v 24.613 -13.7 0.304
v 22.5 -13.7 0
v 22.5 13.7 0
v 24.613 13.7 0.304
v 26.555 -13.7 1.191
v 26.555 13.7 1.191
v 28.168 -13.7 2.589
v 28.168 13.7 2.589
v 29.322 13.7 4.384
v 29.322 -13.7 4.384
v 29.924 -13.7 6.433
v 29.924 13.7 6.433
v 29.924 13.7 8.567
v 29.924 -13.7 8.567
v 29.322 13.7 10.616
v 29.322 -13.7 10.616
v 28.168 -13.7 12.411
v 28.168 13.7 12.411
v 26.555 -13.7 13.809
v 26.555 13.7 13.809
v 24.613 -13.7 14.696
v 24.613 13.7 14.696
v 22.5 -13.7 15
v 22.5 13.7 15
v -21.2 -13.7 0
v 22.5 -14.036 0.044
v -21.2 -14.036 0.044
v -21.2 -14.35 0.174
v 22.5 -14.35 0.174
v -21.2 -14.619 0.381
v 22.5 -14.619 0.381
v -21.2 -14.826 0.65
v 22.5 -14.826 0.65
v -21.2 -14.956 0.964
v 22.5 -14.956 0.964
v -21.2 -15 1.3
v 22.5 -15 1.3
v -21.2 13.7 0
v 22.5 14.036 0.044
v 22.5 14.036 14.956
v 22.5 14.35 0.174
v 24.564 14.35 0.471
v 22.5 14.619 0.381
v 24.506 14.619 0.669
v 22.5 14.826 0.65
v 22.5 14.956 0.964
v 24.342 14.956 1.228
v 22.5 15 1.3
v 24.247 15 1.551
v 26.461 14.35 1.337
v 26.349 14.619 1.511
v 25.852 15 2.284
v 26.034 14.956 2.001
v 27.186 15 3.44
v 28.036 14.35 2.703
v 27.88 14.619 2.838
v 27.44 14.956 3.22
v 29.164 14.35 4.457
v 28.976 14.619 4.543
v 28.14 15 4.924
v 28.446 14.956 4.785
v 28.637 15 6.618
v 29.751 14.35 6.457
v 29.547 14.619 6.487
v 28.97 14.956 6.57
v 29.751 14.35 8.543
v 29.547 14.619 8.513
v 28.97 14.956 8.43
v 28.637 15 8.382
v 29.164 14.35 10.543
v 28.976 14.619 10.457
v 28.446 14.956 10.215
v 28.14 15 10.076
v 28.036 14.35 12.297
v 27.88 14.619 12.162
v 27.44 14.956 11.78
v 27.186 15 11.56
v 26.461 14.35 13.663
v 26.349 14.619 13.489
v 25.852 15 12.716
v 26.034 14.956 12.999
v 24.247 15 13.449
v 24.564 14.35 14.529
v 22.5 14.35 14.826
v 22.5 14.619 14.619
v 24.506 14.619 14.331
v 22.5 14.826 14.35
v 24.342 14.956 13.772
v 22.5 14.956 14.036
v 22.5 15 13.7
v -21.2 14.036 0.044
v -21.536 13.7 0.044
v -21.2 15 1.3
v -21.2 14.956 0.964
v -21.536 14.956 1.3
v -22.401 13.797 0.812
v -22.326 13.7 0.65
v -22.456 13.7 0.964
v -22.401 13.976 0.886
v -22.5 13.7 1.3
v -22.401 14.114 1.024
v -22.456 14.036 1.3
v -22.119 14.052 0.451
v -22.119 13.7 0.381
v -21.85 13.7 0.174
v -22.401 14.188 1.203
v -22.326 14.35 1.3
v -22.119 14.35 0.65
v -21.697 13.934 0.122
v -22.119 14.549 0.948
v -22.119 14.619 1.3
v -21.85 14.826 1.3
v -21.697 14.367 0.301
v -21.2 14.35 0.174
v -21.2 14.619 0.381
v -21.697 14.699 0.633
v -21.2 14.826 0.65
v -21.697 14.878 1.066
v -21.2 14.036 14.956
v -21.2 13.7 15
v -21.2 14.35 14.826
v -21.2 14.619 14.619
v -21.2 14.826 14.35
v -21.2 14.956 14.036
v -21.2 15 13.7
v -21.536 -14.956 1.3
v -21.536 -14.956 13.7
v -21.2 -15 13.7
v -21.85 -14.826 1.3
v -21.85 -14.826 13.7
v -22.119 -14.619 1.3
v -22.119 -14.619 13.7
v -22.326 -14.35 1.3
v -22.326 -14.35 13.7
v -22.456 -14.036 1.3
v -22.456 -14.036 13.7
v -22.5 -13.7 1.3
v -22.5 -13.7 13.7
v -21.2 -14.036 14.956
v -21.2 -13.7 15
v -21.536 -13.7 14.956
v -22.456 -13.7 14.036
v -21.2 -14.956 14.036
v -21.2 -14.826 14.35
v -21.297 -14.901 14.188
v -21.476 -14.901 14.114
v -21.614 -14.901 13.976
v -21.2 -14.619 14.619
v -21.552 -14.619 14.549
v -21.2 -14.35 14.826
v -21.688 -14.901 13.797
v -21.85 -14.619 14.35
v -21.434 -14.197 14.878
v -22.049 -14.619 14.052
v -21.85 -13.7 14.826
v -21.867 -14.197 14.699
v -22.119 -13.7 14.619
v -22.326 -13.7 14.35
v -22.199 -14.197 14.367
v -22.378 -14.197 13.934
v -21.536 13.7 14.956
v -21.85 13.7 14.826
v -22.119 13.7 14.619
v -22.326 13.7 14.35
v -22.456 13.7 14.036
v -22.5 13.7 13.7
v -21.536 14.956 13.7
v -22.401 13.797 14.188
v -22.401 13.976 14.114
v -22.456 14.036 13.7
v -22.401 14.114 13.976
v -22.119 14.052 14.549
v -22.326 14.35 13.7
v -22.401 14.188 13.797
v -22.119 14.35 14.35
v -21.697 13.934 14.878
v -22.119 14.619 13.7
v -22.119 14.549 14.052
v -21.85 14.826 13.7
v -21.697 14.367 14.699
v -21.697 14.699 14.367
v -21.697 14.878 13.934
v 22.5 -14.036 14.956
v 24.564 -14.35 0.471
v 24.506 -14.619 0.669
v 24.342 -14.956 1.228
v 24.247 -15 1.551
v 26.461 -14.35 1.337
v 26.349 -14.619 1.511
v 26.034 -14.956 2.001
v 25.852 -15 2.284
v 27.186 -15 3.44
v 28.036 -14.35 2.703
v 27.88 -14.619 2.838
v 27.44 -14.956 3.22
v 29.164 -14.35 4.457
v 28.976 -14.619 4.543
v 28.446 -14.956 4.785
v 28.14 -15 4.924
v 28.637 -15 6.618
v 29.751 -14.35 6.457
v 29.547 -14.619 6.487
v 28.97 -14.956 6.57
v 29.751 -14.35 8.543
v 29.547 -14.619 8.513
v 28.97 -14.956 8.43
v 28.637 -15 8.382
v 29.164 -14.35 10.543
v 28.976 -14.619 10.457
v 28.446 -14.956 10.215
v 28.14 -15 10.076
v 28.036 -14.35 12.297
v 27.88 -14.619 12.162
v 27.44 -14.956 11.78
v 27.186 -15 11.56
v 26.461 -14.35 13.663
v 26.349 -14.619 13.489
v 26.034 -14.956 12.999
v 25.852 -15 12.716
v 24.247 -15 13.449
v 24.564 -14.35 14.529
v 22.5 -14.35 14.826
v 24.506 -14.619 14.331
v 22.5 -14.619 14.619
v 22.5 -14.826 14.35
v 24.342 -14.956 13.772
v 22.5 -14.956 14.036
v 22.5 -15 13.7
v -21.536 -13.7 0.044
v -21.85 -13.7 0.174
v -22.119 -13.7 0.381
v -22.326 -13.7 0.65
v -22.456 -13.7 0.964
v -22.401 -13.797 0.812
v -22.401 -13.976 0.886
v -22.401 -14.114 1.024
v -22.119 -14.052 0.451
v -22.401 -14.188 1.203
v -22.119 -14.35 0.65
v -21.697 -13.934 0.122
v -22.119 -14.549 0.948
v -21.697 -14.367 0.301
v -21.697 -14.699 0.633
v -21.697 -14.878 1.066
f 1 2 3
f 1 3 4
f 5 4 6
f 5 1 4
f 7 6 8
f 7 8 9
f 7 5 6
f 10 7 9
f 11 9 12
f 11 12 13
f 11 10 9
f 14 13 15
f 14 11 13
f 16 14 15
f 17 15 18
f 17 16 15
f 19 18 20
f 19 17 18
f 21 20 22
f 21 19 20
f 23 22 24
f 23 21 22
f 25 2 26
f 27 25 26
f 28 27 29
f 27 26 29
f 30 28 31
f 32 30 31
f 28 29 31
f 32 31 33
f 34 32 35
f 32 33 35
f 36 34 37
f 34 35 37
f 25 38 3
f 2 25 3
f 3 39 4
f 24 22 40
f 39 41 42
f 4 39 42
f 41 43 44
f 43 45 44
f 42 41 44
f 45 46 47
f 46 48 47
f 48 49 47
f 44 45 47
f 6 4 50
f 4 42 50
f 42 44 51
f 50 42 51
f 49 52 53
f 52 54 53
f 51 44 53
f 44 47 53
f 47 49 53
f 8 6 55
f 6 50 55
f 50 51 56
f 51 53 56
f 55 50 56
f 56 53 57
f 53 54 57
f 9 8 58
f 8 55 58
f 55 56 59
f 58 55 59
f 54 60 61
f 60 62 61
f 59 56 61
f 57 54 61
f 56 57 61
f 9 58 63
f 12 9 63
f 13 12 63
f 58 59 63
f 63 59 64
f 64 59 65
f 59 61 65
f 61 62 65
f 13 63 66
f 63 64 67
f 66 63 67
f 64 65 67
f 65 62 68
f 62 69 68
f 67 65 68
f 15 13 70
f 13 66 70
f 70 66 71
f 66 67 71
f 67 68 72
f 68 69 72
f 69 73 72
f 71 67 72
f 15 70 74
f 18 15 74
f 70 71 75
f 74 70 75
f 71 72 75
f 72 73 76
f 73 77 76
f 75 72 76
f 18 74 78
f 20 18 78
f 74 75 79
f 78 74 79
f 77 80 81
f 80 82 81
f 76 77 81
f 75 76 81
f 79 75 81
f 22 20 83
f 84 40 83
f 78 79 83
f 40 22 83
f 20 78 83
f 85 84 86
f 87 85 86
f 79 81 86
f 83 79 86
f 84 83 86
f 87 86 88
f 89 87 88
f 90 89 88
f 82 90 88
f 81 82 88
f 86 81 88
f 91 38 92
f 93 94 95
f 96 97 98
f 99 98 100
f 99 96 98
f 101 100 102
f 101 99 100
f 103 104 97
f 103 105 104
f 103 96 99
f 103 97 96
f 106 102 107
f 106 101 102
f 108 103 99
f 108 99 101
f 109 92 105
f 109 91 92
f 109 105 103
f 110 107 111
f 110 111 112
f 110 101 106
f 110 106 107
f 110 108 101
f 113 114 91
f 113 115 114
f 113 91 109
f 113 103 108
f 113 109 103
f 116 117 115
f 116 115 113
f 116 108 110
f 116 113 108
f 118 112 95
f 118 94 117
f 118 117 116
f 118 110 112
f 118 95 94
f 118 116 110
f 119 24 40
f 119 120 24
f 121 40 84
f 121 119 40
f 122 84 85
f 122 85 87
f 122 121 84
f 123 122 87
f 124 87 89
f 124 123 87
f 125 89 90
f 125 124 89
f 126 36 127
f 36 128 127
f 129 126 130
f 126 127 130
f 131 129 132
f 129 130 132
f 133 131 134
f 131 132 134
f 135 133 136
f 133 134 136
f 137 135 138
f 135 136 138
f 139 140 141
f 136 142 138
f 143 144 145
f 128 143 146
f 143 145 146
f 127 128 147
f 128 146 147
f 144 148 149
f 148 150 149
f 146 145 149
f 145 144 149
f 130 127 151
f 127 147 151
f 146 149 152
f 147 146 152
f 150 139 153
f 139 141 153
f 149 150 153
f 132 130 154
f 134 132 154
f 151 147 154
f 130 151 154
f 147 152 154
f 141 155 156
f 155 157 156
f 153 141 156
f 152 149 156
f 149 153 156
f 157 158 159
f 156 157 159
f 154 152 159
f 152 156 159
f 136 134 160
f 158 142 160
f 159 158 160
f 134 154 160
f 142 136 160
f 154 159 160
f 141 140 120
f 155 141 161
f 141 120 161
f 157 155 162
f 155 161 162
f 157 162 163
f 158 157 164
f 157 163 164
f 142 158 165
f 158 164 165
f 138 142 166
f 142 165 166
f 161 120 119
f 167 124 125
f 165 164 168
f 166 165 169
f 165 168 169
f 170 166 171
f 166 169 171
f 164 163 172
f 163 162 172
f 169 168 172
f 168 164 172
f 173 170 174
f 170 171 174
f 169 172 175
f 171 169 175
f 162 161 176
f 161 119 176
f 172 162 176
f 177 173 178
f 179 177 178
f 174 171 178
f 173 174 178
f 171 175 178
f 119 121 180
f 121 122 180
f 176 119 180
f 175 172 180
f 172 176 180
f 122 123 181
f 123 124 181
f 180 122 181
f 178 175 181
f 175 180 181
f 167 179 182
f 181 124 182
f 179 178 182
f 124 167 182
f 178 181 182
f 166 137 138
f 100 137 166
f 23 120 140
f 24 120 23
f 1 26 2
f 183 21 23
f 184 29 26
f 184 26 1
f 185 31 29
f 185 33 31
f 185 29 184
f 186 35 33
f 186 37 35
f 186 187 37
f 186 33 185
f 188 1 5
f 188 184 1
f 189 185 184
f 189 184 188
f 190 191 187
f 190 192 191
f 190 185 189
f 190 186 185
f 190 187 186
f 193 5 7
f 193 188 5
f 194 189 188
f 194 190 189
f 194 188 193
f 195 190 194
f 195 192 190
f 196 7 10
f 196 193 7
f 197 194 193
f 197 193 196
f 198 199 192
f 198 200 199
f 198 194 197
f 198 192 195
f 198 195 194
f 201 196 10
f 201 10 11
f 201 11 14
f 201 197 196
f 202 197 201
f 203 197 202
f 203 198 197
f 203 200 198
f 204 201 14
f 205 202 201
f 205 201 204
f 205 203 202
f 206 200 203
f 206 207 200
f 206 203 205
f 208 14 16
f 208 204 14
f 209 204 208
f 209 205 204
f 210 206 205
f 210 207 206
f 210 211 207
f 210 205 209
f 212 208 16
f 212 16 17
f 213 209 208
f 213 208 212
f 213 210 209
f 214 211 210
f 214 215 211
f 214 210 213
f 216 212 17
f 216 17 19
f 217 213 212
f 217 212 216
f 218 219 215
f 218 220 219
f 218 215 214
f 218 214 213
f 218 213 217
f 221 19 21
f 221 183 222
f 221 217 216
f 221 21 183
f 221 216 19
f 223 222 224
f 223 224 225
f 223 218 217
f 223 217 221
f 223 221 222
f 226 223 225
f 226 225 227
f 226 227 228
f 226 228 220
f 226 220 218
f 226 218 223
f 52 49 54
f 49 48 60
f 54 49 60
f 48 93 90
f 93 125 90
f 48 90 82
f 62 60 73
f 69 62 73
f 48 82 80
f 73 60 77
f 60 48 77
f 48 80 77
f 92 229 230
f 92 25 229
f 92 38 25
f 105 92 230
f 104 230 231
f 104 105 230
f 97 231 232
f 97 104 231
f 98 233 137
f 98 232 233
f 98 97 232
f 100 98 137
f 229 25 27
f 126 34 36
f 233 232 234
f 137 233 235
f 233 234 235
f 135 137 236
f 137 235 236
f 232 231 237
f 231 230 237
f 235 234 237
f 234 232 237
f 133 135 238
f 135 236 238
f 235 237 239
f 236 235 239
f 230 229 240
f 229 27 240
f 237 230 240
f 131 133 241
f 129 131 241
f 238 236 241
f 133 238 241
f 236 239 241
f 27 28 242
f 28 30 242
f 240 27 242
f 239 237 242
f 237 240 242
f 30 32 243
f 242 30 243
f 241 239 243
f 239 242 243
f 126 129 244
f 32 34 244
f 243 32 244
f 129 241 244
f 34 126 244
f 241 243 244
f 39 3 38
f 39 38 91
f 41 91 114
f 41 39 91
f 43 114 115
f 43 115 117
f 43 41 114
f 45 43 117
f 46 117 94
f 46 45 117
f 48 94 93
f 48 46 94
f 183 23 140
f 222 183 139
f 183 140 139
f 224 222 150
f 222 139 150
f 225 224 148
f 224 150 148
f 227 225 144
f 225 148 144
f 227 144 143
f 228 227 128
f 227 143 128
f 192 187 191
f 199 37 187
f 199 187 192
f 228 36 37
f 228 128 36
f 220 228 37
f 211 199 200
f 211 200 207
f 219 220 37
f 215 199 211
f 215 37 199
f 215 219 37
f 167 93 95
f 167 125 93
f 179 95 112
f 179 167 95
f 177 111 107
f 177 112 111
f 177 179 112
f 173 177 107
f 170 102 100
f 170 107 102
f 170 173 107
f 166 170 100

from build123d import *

# Parameters (mm, degrees)
F0_W     = 45
F0_H     = 30
F1_DEPTH = 15
F3_DEPTH = 30
F4_R     = 1.3


with BuildPart() as f1:
    # F0 (on Top) → F1 (new body)
    with BuildSketch(Plane.XY):
        Rectangle(F0_W, F0_H)
    extrude(amount=F1_DEPTH)

    # F2 (on face) → F3 (join, through all)
    with BuildSketch(Plane.XZ.offset(15)):
        with BuildLine():
            Line((22.5, 15), (22.5, 0))
            ThreePointArc((22.5, 0), (30, 7.5), (22.5, 15))
        make_face()
    extrude(amount=-F3_DEPTH)

    # F4
    f4_edges = [f1.edges().sort_by_distance(p)[0] for p in [
        (30, 15, 7.5),
        (0, 15, 0),
        (0, 15, 15),
        (22.5, 0, 15),
        (22.5, 0, 0),
        (-22.5, 0, 15),
        (0, -15, 0),
        (0, -15, 15),
        (-22.5, 0, 0),
        (-22.5, -15, 7.5),
        (-22.5, 15, 7.5),
        (30, -15, 7.5),
    ]]
    fillet(f4_edges, radius=F4_R)


solid = f1.part
